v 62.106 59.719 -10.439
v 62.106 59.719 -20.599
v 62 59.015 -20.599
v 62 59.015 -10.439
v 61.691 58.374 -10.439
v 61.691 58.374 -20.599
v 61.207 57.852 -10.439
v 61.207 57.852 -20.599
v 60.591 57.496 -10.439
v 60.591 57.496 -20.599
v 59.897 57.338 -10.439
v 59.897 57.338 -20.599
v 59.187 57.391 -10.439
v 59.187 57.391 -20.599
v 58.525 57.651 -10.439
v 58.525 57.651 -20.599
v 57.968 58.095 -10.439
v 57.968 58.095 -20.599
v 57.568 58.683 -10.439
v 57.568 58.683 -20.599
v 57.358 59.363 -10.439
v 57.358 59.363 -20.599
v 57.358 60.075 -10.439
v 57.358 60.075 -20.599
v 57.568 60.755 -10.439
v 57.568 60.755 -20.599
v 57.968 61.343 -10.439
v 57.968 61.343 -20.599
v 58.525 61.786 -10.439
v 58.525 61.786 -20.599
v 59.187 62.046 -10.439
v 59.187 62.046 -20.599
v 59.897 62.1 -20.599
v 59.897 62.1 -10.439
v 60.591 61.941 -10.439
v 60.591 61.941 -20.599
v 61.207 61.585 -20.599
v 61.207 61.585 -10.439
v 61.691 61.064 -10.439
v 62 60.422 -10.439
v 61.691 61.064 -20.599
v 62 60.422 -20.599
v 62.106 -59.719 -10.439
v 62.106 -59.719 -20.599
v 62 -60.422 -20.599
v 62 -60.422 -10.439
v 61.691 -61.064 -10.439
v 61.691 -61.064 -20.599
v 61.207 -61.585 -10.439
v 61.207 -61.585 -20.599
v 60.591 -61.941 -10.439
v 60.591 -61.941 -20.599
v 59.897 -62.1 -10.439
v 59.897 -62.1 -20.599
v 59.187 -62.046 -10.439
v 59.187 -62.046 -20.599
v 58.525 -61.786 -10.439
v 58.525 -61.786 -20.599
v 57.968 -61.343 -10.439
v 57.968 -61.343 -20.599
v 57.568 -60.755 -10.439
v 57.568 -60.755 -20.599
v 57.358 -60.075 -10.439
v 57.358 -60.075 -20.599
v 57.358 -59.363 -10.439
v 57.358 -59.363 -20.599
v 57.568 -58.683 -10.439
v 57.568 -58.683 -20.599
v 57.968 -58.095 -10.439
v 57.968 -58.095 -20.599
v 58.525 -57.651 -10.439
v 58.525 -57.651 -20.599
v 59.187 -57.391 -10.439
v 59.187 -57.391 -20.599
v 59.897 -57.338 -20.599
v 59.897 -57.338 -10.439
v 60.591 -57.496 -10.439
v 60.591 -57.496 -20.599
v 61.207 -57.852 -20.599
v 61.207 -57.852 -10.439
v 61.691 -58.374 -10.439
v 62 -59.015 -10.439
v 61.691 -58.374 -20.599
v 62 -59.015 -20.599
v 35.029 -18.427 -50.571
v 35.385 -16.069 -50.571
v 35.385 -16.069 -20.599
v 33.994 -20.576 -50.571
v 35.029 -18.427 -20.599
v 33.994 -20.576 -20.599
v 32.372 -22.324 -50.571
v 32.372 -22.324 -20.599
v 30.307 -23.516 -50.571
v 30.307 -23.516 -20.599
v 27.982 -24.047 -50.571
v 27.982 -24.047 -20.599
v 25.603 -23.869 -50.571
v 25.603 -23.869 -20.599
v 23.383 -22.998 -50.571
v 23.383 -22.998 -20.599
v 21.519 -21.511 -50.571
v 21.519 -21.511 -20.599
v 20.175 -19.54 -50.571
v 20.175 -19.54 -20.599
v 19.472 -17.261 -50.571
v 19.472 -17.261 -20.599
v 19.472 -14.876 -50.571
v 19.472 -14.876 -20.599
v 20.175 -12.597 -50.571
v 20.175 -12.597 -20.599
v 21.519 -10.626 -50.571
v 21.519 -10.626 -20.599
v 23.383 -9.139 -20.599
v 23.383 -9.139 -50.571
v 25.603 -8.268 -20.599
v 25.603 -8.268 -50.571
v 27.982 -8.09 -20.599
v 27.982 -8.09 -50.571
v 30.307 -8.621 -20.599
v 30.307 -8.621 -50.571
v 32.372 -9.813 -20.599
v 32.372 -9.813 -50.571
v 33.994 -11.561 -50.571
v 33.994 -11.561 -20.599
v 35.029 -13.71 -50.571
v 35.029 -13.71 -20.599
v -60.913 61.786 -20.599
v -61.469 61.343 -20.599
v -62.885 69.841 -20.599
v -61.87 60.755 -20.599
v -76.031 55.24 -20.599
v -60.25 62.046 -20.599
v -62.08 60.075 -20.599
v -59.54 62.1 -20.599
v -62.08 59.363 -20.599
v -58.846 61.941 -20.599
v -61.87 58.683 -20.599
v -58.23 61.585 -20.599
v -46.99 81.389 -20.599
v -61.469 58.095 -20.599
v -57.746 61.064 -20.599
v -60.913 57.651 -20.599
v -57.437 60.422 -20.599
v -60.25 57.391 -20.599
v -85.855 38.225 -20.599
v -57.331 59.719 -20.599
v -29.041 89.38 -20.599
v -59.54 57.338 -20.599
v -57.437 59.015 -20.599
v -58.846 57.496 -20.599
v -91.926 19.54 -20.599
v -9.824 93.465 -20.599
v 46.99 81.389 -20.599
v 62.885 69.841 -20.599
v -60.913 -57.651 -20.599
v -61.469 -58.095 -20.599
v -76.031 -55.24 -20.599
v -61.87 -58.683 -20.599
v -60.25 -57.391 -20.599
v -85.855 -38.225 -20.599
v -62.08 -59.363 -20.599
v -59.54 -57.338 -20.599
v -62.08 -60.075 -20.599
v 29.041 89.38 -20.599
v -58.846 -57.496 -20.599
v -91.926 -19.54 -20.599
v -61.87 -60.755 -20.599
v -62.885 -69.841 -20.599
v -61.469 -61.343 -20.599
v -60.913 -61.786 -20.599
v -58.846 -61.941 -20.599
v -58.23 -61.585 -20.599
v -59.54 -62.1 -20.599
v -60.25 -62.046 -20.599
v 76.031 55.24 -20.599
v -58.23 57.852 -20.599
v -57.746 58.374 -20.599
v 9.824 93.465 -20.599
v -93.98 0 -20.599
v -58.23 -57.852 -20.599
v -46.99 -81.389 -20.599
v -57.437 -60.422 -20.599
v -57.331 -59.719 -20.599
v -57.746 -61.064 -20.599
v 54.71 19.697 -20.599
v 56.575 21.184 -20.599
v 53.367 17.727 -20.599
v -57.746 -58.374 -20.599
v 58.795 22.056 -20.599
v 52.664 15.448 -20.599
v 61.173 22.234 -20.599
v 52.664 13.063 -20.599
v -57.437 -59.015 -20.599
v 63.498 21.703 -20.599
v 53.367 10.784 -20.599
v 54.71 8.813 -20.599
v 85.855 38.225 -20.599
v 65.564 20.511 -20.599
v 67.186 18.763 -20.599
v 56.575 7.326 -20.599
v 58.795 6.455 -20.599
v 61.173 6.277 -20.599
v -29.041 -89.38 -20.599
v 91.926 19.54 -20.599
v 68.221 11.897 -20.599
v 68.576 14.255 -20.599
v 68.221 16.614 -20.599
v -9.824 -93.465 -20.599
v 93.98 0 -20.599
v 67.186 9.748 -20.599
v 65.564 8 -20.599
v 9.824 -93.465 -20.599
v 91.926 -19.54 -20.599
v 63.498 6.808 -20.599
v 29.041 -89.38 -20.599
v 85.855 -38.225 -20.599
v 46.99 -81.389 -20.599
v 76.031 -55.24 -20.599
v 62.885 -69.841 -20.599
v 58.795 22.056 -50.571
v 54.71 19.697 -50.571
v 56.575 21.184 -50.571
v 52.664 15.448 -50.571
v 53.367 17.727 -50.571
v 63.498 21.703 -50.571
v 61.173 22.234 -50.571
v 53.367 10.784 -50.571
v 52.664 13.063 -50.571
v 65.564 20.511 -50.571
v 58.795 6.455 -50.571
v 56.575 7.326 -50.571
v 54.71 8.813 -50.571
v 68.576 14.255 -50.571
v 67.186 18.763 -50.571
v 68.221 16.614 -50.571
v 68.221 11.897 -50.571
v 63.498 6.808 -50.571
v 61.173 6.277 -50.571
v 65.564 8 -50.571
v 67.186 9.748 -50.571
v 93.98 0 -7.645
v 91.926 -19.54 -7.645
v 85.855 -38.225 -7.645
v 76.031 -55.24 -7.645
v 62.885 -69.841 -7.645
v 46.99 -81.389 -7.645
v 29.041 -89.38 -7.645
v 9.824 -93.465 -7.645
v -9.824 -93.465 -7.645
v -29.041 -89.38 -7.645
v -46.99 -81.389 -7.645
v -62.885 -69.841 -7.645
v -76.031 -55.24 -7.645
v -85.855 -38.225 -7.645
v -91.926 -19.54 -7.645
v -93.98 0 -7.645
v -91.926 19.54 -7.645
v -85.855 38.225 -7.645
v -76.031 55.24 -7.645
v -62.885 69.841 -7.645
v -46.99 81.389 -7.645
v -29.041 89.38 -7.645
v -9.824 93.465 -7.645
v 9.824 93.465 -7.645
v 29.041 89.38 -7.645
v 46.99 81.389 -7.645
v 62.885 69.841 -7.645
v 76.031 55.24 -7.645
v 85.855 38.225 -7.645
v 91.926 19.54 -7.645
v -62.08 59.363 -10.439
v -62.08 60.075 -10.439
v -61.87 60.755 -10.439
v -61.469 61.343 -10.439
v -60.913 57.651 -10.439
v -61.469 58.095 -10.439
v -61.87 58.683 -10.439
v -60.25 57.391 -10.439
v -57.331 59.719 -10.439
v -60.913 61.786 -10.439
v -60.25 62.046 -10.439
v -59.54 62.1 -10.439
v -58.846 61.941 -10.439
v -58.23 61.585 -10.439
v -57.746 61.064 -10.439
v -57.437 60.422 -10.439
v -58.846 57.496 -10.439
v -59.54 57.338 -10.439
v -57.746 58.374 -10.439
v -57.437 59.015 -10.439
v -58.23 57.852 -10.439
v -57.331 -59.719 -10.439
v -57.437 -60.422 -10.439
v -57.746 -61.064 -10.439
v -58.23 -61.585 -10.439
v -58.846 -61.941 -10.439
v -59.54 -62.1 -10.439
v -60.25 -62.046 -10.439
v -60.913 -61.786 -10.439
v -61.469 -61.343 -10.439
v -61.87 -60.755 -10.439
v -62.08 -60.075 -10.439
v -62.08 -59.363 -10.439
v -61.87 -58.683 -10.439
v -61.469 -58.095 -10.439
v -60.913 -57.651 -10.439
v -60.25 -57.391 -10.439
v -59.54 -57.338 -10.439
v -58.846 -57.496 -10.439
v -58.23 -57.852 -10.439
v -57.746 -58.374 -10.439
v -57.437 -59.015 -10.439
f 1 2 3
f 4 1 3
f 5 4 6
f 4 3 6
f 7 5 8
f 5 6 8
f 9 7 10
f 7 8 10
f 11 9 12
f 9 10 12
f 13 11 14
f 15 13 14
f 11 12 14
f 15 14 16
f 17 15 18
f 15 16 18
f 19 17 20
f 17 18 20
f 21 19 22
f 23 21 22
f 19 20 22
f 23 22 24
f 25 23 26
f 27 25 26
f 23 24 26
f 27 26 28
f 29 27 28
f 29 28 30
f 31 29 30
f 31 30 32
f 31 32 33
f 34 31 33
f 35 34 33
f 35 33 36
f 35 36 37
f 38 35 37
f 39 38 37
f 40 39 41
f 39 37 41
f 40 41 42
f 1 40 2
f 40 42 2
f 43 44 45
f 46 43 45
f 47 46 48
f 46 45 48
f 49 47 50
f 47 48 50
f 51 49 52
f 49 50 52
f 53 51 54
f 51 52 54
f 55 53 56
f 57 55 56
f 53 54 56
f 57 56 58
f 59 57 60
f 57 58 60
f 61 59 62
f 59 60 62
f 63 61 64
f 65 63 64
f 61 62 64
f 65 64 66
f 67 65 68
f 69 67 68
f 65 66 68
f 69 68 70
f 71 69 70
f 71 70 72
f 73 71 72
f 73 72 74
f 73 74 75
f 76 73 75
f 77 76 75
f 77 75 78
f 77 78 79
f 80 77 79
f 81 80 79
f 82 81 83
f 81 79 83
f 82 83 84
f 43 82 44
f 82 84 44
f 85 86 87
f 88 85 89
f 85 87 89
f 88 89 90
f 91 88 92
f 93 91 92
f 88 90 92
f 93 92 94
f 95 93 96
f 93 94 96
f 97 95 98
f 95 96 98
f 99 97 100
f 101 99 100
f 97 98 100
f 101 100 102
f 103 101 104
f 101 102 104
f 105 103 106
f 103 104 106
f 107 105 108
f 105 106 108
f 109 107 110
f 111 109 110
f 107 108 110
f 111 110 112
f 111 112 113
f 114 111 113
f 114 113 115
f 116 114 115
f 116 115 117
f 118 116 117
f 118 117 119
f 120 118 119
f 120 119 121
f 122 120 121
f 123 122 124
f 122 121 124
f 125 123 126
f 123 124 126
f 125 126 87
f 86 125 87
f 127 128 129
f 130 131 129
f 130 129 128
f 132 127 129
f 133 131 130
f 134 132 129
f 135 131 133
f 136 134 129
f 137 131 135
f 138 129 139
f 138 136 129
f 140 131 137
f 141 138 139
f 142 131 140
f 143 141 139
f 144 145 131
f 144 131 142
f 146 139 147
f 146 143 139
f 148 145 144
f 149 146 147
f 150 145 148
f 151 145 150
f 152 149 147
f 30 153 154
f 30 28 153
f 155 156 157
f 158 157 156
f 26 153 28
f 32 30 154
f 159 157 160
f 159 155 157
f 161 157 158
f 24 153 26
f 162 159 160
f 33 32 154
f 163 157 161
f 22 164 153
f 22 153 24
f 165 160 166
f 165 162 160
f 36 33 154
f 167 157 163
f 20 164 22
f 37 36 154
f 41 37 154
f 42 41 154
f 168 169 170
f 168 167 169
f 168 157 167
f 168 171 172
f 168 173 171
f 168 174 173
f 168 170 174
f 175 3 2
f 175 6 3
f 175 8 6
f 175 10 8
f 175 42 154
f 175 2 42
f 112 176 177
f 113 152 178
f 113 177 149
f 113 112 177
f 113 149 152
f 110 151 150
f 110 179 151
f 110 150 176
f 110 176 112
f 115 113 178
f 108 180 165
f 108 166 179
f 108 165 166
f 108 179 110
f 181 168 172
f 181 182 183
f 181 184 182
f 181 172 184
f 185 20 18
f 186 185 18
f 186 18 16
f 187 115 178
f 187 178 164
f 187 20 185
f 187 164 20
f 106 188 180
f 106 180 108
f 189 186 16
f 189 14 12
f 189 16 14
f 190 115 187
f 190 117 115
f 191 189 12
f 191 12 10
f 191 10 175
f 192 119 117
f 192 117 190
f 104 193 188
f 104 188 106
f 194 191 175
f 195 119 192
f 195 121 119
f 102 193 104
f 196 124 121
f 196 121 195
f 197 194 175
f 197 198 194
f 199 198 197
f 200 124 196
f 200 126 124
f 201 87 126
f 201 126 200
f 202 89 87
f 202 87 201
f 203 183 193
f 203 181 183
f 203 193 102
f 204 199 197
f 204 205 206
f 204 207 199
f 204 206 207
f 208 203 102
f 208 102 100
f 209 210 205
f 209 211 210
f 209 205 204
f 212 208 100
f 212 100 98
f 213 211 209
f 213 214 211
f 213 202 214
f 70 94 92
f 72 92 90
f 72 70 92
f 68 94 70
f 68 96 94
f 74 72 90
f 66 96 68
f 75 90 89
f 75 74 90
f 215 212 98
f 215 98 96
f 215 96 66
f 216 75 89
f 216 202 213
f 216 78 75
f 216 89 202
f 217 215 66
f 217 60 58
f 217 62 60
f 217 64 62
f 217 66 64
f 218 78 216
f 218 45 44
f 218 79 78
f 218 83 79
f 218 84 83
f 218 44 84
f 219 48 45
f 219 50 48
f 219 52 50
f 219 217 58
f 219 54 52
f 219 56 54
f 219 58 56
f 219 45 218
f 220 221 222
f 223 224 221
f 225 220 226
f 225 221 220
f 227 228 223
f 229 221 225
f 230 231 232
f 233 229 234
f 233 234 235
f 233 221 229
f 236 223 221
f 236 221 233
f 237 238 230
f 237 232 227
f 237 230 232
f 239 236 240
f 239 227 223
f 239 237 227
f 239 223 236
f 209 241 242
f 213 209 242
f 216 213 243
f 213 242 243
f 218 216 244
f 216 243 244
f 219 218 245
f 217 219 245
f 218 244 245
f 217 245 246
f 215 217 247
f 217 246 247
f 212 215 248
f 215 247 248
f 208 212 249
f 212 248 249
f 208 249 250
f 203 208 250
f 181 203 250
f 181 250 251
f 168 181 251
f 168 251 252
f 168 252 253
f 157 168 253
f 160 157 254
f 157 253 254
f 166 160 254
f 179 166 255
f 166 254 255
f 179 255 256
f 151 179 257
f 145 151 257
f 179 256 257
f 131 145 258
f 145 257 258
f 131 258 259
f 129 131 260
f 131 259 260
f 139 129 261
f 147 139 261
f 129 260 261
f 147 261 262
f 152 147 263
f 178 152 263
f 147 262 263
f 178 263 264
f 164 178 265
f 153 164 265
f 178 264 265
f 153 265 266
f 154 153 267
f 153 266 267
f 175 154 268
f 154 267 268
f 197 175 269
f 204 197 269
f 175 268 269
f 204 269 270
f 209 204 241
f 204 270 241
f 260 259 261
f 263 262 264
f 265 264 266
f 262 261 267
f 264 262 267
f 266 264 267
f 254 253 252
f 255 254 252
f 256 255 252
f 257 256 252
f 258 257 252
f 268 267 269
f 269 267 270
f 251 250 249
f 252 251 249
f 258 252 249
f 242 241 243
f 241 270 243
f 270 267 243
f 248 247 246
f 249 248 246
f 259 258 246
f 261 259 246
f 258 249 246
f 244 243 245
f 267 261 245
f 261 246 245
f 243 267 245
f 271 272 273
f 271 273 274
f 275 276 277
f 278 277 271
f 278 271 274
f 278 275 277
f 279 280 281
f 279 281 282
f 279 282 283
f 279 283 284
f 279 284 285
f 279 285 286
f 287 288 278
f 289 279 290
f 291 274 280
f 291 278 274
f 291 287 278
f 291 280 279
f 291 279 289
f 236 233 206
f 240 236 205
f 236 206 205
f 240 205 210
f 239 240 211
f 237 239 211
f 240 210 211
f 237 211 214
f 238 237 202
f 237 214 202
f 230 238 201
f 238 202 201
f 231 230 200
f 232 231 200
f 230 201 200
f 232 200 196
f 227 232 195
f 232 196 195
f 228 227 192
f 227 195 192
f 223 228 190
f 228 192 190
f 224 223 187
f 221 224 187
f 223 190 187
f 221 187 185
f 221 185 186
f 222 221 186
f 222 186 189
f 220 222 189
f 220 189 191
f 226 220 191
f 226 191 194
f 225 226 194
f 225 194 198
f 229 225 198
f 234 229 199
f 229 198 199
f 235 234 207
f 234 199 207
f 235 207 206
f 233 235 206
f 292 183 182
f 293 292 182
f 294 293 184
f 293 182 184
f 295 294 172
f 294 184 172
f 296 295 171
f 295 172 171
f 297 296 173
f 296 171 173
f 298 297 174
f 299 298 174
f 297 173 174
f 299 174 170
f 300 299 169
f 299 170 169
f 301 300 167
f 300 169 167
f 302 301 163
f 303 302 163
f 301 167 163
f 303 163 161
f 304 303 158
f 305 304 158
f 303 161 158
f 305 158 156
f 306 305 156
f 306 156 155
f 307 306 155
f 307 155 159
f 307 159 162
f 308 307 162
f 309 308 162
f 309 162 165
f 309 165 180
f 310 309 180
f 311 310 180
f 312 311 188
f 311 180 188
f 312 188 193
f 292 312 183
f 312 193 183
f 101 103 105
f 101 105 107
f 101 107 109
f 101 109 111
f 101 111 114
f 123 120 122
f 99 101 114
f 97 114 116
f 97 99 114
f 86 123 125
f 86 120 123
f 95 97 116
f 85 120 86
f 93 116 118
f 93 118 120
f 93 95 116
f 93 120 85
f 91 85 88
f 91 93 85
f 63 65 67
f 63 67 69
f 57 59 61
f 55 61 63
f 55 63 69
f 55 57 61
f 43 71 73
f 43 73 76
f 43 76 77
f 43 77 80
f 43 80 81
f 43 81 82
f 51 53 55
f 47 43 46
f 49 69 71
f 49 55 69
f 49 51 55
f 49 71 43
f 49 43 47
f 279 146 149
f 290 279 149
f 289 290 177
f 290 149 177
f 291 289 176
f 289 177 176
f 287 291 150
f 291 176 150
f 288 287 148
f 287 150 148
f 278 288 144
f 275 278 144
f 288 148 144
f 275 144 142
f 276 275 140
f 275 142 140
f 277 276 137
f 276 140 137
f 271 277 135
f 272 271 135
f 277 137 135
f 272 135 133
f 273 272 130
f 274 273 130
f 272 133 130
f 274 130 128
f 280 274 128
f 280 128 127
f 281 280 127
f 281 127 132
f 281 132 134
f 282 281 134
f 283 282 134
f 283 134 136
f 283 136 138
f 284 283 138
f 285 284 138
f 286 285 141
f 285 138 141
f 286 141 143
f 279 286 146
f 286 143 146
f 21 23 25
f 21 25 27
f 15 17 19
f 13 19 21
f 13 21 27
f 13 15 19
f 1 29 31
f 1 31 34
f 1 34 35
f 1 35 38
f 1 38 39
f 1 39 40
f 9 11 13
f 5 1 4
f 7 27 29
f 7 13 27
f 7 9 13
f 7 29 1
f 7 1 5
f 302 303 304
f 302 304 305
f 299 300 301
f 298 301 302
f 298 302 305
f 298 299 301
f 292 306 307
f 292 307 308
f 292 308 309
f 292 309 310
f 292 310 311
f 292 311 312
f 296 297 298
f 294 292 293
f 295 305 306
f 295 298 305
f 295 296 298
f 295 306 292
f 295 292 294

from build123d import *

# Parameters (mm, degrees)
CYLINDER_R      = 93.98
CYLINDER_DEPTH  = 12.954
SKETCH014_R     = 2.3876
POCKET006_DEPTH = 10.16
SKETCH015_R     = 8.001
PAD006_DEPTH    = 29.972


with BuildPart() as part:
    # Cylinder → Cylinder (new body)
    with BuildSketch(Plane(origin=(0, 0, -7.6454), x_dir=(1, 0, 0), z_dir=(0, 0, -1))):
        Circle(CYLINDER_R)
    extrude(amount=CYLINDER_DEPTH)

    # Sketch014 → Pocket006 (cut)
    with BuildSketch(Plane(origin=(0, 0, -20.5994), x_dir=(1, 0, 0), z_dir=(0, 0, -1))):
        with Locations((-59.718703, 59.718703)):
            Circle(SKETCH014_R)
        with Locations((59.718703, -59.718703)):
            Circle(SKETCH014_R)
        with Locations((59.718703, 59.718703)):
            Circle(SKETCH014_R)
        with Locations((-59.718703, -59.718703)):
            Circle(SKETCH014_R)
    extrude(amount=-POCKET006_DEPTH, mode=Mode.SUBTRACT)

    # Sketch015 → Pad006 (new body)
    with BuildSketch(Plane(origin=(0, 0, -20.5994), x_dir=(1, 0, 0), z_dir=(0, 0, -1))):
        with Locations((27.383657, 16.068535)):
            Circle(SKETCH015_R)
        with Locations((60.575206, -14.25543)):
            Circle(SKETCH015_R)
    extrude(amount=PAD006_DEPTH)


solid = part.part
